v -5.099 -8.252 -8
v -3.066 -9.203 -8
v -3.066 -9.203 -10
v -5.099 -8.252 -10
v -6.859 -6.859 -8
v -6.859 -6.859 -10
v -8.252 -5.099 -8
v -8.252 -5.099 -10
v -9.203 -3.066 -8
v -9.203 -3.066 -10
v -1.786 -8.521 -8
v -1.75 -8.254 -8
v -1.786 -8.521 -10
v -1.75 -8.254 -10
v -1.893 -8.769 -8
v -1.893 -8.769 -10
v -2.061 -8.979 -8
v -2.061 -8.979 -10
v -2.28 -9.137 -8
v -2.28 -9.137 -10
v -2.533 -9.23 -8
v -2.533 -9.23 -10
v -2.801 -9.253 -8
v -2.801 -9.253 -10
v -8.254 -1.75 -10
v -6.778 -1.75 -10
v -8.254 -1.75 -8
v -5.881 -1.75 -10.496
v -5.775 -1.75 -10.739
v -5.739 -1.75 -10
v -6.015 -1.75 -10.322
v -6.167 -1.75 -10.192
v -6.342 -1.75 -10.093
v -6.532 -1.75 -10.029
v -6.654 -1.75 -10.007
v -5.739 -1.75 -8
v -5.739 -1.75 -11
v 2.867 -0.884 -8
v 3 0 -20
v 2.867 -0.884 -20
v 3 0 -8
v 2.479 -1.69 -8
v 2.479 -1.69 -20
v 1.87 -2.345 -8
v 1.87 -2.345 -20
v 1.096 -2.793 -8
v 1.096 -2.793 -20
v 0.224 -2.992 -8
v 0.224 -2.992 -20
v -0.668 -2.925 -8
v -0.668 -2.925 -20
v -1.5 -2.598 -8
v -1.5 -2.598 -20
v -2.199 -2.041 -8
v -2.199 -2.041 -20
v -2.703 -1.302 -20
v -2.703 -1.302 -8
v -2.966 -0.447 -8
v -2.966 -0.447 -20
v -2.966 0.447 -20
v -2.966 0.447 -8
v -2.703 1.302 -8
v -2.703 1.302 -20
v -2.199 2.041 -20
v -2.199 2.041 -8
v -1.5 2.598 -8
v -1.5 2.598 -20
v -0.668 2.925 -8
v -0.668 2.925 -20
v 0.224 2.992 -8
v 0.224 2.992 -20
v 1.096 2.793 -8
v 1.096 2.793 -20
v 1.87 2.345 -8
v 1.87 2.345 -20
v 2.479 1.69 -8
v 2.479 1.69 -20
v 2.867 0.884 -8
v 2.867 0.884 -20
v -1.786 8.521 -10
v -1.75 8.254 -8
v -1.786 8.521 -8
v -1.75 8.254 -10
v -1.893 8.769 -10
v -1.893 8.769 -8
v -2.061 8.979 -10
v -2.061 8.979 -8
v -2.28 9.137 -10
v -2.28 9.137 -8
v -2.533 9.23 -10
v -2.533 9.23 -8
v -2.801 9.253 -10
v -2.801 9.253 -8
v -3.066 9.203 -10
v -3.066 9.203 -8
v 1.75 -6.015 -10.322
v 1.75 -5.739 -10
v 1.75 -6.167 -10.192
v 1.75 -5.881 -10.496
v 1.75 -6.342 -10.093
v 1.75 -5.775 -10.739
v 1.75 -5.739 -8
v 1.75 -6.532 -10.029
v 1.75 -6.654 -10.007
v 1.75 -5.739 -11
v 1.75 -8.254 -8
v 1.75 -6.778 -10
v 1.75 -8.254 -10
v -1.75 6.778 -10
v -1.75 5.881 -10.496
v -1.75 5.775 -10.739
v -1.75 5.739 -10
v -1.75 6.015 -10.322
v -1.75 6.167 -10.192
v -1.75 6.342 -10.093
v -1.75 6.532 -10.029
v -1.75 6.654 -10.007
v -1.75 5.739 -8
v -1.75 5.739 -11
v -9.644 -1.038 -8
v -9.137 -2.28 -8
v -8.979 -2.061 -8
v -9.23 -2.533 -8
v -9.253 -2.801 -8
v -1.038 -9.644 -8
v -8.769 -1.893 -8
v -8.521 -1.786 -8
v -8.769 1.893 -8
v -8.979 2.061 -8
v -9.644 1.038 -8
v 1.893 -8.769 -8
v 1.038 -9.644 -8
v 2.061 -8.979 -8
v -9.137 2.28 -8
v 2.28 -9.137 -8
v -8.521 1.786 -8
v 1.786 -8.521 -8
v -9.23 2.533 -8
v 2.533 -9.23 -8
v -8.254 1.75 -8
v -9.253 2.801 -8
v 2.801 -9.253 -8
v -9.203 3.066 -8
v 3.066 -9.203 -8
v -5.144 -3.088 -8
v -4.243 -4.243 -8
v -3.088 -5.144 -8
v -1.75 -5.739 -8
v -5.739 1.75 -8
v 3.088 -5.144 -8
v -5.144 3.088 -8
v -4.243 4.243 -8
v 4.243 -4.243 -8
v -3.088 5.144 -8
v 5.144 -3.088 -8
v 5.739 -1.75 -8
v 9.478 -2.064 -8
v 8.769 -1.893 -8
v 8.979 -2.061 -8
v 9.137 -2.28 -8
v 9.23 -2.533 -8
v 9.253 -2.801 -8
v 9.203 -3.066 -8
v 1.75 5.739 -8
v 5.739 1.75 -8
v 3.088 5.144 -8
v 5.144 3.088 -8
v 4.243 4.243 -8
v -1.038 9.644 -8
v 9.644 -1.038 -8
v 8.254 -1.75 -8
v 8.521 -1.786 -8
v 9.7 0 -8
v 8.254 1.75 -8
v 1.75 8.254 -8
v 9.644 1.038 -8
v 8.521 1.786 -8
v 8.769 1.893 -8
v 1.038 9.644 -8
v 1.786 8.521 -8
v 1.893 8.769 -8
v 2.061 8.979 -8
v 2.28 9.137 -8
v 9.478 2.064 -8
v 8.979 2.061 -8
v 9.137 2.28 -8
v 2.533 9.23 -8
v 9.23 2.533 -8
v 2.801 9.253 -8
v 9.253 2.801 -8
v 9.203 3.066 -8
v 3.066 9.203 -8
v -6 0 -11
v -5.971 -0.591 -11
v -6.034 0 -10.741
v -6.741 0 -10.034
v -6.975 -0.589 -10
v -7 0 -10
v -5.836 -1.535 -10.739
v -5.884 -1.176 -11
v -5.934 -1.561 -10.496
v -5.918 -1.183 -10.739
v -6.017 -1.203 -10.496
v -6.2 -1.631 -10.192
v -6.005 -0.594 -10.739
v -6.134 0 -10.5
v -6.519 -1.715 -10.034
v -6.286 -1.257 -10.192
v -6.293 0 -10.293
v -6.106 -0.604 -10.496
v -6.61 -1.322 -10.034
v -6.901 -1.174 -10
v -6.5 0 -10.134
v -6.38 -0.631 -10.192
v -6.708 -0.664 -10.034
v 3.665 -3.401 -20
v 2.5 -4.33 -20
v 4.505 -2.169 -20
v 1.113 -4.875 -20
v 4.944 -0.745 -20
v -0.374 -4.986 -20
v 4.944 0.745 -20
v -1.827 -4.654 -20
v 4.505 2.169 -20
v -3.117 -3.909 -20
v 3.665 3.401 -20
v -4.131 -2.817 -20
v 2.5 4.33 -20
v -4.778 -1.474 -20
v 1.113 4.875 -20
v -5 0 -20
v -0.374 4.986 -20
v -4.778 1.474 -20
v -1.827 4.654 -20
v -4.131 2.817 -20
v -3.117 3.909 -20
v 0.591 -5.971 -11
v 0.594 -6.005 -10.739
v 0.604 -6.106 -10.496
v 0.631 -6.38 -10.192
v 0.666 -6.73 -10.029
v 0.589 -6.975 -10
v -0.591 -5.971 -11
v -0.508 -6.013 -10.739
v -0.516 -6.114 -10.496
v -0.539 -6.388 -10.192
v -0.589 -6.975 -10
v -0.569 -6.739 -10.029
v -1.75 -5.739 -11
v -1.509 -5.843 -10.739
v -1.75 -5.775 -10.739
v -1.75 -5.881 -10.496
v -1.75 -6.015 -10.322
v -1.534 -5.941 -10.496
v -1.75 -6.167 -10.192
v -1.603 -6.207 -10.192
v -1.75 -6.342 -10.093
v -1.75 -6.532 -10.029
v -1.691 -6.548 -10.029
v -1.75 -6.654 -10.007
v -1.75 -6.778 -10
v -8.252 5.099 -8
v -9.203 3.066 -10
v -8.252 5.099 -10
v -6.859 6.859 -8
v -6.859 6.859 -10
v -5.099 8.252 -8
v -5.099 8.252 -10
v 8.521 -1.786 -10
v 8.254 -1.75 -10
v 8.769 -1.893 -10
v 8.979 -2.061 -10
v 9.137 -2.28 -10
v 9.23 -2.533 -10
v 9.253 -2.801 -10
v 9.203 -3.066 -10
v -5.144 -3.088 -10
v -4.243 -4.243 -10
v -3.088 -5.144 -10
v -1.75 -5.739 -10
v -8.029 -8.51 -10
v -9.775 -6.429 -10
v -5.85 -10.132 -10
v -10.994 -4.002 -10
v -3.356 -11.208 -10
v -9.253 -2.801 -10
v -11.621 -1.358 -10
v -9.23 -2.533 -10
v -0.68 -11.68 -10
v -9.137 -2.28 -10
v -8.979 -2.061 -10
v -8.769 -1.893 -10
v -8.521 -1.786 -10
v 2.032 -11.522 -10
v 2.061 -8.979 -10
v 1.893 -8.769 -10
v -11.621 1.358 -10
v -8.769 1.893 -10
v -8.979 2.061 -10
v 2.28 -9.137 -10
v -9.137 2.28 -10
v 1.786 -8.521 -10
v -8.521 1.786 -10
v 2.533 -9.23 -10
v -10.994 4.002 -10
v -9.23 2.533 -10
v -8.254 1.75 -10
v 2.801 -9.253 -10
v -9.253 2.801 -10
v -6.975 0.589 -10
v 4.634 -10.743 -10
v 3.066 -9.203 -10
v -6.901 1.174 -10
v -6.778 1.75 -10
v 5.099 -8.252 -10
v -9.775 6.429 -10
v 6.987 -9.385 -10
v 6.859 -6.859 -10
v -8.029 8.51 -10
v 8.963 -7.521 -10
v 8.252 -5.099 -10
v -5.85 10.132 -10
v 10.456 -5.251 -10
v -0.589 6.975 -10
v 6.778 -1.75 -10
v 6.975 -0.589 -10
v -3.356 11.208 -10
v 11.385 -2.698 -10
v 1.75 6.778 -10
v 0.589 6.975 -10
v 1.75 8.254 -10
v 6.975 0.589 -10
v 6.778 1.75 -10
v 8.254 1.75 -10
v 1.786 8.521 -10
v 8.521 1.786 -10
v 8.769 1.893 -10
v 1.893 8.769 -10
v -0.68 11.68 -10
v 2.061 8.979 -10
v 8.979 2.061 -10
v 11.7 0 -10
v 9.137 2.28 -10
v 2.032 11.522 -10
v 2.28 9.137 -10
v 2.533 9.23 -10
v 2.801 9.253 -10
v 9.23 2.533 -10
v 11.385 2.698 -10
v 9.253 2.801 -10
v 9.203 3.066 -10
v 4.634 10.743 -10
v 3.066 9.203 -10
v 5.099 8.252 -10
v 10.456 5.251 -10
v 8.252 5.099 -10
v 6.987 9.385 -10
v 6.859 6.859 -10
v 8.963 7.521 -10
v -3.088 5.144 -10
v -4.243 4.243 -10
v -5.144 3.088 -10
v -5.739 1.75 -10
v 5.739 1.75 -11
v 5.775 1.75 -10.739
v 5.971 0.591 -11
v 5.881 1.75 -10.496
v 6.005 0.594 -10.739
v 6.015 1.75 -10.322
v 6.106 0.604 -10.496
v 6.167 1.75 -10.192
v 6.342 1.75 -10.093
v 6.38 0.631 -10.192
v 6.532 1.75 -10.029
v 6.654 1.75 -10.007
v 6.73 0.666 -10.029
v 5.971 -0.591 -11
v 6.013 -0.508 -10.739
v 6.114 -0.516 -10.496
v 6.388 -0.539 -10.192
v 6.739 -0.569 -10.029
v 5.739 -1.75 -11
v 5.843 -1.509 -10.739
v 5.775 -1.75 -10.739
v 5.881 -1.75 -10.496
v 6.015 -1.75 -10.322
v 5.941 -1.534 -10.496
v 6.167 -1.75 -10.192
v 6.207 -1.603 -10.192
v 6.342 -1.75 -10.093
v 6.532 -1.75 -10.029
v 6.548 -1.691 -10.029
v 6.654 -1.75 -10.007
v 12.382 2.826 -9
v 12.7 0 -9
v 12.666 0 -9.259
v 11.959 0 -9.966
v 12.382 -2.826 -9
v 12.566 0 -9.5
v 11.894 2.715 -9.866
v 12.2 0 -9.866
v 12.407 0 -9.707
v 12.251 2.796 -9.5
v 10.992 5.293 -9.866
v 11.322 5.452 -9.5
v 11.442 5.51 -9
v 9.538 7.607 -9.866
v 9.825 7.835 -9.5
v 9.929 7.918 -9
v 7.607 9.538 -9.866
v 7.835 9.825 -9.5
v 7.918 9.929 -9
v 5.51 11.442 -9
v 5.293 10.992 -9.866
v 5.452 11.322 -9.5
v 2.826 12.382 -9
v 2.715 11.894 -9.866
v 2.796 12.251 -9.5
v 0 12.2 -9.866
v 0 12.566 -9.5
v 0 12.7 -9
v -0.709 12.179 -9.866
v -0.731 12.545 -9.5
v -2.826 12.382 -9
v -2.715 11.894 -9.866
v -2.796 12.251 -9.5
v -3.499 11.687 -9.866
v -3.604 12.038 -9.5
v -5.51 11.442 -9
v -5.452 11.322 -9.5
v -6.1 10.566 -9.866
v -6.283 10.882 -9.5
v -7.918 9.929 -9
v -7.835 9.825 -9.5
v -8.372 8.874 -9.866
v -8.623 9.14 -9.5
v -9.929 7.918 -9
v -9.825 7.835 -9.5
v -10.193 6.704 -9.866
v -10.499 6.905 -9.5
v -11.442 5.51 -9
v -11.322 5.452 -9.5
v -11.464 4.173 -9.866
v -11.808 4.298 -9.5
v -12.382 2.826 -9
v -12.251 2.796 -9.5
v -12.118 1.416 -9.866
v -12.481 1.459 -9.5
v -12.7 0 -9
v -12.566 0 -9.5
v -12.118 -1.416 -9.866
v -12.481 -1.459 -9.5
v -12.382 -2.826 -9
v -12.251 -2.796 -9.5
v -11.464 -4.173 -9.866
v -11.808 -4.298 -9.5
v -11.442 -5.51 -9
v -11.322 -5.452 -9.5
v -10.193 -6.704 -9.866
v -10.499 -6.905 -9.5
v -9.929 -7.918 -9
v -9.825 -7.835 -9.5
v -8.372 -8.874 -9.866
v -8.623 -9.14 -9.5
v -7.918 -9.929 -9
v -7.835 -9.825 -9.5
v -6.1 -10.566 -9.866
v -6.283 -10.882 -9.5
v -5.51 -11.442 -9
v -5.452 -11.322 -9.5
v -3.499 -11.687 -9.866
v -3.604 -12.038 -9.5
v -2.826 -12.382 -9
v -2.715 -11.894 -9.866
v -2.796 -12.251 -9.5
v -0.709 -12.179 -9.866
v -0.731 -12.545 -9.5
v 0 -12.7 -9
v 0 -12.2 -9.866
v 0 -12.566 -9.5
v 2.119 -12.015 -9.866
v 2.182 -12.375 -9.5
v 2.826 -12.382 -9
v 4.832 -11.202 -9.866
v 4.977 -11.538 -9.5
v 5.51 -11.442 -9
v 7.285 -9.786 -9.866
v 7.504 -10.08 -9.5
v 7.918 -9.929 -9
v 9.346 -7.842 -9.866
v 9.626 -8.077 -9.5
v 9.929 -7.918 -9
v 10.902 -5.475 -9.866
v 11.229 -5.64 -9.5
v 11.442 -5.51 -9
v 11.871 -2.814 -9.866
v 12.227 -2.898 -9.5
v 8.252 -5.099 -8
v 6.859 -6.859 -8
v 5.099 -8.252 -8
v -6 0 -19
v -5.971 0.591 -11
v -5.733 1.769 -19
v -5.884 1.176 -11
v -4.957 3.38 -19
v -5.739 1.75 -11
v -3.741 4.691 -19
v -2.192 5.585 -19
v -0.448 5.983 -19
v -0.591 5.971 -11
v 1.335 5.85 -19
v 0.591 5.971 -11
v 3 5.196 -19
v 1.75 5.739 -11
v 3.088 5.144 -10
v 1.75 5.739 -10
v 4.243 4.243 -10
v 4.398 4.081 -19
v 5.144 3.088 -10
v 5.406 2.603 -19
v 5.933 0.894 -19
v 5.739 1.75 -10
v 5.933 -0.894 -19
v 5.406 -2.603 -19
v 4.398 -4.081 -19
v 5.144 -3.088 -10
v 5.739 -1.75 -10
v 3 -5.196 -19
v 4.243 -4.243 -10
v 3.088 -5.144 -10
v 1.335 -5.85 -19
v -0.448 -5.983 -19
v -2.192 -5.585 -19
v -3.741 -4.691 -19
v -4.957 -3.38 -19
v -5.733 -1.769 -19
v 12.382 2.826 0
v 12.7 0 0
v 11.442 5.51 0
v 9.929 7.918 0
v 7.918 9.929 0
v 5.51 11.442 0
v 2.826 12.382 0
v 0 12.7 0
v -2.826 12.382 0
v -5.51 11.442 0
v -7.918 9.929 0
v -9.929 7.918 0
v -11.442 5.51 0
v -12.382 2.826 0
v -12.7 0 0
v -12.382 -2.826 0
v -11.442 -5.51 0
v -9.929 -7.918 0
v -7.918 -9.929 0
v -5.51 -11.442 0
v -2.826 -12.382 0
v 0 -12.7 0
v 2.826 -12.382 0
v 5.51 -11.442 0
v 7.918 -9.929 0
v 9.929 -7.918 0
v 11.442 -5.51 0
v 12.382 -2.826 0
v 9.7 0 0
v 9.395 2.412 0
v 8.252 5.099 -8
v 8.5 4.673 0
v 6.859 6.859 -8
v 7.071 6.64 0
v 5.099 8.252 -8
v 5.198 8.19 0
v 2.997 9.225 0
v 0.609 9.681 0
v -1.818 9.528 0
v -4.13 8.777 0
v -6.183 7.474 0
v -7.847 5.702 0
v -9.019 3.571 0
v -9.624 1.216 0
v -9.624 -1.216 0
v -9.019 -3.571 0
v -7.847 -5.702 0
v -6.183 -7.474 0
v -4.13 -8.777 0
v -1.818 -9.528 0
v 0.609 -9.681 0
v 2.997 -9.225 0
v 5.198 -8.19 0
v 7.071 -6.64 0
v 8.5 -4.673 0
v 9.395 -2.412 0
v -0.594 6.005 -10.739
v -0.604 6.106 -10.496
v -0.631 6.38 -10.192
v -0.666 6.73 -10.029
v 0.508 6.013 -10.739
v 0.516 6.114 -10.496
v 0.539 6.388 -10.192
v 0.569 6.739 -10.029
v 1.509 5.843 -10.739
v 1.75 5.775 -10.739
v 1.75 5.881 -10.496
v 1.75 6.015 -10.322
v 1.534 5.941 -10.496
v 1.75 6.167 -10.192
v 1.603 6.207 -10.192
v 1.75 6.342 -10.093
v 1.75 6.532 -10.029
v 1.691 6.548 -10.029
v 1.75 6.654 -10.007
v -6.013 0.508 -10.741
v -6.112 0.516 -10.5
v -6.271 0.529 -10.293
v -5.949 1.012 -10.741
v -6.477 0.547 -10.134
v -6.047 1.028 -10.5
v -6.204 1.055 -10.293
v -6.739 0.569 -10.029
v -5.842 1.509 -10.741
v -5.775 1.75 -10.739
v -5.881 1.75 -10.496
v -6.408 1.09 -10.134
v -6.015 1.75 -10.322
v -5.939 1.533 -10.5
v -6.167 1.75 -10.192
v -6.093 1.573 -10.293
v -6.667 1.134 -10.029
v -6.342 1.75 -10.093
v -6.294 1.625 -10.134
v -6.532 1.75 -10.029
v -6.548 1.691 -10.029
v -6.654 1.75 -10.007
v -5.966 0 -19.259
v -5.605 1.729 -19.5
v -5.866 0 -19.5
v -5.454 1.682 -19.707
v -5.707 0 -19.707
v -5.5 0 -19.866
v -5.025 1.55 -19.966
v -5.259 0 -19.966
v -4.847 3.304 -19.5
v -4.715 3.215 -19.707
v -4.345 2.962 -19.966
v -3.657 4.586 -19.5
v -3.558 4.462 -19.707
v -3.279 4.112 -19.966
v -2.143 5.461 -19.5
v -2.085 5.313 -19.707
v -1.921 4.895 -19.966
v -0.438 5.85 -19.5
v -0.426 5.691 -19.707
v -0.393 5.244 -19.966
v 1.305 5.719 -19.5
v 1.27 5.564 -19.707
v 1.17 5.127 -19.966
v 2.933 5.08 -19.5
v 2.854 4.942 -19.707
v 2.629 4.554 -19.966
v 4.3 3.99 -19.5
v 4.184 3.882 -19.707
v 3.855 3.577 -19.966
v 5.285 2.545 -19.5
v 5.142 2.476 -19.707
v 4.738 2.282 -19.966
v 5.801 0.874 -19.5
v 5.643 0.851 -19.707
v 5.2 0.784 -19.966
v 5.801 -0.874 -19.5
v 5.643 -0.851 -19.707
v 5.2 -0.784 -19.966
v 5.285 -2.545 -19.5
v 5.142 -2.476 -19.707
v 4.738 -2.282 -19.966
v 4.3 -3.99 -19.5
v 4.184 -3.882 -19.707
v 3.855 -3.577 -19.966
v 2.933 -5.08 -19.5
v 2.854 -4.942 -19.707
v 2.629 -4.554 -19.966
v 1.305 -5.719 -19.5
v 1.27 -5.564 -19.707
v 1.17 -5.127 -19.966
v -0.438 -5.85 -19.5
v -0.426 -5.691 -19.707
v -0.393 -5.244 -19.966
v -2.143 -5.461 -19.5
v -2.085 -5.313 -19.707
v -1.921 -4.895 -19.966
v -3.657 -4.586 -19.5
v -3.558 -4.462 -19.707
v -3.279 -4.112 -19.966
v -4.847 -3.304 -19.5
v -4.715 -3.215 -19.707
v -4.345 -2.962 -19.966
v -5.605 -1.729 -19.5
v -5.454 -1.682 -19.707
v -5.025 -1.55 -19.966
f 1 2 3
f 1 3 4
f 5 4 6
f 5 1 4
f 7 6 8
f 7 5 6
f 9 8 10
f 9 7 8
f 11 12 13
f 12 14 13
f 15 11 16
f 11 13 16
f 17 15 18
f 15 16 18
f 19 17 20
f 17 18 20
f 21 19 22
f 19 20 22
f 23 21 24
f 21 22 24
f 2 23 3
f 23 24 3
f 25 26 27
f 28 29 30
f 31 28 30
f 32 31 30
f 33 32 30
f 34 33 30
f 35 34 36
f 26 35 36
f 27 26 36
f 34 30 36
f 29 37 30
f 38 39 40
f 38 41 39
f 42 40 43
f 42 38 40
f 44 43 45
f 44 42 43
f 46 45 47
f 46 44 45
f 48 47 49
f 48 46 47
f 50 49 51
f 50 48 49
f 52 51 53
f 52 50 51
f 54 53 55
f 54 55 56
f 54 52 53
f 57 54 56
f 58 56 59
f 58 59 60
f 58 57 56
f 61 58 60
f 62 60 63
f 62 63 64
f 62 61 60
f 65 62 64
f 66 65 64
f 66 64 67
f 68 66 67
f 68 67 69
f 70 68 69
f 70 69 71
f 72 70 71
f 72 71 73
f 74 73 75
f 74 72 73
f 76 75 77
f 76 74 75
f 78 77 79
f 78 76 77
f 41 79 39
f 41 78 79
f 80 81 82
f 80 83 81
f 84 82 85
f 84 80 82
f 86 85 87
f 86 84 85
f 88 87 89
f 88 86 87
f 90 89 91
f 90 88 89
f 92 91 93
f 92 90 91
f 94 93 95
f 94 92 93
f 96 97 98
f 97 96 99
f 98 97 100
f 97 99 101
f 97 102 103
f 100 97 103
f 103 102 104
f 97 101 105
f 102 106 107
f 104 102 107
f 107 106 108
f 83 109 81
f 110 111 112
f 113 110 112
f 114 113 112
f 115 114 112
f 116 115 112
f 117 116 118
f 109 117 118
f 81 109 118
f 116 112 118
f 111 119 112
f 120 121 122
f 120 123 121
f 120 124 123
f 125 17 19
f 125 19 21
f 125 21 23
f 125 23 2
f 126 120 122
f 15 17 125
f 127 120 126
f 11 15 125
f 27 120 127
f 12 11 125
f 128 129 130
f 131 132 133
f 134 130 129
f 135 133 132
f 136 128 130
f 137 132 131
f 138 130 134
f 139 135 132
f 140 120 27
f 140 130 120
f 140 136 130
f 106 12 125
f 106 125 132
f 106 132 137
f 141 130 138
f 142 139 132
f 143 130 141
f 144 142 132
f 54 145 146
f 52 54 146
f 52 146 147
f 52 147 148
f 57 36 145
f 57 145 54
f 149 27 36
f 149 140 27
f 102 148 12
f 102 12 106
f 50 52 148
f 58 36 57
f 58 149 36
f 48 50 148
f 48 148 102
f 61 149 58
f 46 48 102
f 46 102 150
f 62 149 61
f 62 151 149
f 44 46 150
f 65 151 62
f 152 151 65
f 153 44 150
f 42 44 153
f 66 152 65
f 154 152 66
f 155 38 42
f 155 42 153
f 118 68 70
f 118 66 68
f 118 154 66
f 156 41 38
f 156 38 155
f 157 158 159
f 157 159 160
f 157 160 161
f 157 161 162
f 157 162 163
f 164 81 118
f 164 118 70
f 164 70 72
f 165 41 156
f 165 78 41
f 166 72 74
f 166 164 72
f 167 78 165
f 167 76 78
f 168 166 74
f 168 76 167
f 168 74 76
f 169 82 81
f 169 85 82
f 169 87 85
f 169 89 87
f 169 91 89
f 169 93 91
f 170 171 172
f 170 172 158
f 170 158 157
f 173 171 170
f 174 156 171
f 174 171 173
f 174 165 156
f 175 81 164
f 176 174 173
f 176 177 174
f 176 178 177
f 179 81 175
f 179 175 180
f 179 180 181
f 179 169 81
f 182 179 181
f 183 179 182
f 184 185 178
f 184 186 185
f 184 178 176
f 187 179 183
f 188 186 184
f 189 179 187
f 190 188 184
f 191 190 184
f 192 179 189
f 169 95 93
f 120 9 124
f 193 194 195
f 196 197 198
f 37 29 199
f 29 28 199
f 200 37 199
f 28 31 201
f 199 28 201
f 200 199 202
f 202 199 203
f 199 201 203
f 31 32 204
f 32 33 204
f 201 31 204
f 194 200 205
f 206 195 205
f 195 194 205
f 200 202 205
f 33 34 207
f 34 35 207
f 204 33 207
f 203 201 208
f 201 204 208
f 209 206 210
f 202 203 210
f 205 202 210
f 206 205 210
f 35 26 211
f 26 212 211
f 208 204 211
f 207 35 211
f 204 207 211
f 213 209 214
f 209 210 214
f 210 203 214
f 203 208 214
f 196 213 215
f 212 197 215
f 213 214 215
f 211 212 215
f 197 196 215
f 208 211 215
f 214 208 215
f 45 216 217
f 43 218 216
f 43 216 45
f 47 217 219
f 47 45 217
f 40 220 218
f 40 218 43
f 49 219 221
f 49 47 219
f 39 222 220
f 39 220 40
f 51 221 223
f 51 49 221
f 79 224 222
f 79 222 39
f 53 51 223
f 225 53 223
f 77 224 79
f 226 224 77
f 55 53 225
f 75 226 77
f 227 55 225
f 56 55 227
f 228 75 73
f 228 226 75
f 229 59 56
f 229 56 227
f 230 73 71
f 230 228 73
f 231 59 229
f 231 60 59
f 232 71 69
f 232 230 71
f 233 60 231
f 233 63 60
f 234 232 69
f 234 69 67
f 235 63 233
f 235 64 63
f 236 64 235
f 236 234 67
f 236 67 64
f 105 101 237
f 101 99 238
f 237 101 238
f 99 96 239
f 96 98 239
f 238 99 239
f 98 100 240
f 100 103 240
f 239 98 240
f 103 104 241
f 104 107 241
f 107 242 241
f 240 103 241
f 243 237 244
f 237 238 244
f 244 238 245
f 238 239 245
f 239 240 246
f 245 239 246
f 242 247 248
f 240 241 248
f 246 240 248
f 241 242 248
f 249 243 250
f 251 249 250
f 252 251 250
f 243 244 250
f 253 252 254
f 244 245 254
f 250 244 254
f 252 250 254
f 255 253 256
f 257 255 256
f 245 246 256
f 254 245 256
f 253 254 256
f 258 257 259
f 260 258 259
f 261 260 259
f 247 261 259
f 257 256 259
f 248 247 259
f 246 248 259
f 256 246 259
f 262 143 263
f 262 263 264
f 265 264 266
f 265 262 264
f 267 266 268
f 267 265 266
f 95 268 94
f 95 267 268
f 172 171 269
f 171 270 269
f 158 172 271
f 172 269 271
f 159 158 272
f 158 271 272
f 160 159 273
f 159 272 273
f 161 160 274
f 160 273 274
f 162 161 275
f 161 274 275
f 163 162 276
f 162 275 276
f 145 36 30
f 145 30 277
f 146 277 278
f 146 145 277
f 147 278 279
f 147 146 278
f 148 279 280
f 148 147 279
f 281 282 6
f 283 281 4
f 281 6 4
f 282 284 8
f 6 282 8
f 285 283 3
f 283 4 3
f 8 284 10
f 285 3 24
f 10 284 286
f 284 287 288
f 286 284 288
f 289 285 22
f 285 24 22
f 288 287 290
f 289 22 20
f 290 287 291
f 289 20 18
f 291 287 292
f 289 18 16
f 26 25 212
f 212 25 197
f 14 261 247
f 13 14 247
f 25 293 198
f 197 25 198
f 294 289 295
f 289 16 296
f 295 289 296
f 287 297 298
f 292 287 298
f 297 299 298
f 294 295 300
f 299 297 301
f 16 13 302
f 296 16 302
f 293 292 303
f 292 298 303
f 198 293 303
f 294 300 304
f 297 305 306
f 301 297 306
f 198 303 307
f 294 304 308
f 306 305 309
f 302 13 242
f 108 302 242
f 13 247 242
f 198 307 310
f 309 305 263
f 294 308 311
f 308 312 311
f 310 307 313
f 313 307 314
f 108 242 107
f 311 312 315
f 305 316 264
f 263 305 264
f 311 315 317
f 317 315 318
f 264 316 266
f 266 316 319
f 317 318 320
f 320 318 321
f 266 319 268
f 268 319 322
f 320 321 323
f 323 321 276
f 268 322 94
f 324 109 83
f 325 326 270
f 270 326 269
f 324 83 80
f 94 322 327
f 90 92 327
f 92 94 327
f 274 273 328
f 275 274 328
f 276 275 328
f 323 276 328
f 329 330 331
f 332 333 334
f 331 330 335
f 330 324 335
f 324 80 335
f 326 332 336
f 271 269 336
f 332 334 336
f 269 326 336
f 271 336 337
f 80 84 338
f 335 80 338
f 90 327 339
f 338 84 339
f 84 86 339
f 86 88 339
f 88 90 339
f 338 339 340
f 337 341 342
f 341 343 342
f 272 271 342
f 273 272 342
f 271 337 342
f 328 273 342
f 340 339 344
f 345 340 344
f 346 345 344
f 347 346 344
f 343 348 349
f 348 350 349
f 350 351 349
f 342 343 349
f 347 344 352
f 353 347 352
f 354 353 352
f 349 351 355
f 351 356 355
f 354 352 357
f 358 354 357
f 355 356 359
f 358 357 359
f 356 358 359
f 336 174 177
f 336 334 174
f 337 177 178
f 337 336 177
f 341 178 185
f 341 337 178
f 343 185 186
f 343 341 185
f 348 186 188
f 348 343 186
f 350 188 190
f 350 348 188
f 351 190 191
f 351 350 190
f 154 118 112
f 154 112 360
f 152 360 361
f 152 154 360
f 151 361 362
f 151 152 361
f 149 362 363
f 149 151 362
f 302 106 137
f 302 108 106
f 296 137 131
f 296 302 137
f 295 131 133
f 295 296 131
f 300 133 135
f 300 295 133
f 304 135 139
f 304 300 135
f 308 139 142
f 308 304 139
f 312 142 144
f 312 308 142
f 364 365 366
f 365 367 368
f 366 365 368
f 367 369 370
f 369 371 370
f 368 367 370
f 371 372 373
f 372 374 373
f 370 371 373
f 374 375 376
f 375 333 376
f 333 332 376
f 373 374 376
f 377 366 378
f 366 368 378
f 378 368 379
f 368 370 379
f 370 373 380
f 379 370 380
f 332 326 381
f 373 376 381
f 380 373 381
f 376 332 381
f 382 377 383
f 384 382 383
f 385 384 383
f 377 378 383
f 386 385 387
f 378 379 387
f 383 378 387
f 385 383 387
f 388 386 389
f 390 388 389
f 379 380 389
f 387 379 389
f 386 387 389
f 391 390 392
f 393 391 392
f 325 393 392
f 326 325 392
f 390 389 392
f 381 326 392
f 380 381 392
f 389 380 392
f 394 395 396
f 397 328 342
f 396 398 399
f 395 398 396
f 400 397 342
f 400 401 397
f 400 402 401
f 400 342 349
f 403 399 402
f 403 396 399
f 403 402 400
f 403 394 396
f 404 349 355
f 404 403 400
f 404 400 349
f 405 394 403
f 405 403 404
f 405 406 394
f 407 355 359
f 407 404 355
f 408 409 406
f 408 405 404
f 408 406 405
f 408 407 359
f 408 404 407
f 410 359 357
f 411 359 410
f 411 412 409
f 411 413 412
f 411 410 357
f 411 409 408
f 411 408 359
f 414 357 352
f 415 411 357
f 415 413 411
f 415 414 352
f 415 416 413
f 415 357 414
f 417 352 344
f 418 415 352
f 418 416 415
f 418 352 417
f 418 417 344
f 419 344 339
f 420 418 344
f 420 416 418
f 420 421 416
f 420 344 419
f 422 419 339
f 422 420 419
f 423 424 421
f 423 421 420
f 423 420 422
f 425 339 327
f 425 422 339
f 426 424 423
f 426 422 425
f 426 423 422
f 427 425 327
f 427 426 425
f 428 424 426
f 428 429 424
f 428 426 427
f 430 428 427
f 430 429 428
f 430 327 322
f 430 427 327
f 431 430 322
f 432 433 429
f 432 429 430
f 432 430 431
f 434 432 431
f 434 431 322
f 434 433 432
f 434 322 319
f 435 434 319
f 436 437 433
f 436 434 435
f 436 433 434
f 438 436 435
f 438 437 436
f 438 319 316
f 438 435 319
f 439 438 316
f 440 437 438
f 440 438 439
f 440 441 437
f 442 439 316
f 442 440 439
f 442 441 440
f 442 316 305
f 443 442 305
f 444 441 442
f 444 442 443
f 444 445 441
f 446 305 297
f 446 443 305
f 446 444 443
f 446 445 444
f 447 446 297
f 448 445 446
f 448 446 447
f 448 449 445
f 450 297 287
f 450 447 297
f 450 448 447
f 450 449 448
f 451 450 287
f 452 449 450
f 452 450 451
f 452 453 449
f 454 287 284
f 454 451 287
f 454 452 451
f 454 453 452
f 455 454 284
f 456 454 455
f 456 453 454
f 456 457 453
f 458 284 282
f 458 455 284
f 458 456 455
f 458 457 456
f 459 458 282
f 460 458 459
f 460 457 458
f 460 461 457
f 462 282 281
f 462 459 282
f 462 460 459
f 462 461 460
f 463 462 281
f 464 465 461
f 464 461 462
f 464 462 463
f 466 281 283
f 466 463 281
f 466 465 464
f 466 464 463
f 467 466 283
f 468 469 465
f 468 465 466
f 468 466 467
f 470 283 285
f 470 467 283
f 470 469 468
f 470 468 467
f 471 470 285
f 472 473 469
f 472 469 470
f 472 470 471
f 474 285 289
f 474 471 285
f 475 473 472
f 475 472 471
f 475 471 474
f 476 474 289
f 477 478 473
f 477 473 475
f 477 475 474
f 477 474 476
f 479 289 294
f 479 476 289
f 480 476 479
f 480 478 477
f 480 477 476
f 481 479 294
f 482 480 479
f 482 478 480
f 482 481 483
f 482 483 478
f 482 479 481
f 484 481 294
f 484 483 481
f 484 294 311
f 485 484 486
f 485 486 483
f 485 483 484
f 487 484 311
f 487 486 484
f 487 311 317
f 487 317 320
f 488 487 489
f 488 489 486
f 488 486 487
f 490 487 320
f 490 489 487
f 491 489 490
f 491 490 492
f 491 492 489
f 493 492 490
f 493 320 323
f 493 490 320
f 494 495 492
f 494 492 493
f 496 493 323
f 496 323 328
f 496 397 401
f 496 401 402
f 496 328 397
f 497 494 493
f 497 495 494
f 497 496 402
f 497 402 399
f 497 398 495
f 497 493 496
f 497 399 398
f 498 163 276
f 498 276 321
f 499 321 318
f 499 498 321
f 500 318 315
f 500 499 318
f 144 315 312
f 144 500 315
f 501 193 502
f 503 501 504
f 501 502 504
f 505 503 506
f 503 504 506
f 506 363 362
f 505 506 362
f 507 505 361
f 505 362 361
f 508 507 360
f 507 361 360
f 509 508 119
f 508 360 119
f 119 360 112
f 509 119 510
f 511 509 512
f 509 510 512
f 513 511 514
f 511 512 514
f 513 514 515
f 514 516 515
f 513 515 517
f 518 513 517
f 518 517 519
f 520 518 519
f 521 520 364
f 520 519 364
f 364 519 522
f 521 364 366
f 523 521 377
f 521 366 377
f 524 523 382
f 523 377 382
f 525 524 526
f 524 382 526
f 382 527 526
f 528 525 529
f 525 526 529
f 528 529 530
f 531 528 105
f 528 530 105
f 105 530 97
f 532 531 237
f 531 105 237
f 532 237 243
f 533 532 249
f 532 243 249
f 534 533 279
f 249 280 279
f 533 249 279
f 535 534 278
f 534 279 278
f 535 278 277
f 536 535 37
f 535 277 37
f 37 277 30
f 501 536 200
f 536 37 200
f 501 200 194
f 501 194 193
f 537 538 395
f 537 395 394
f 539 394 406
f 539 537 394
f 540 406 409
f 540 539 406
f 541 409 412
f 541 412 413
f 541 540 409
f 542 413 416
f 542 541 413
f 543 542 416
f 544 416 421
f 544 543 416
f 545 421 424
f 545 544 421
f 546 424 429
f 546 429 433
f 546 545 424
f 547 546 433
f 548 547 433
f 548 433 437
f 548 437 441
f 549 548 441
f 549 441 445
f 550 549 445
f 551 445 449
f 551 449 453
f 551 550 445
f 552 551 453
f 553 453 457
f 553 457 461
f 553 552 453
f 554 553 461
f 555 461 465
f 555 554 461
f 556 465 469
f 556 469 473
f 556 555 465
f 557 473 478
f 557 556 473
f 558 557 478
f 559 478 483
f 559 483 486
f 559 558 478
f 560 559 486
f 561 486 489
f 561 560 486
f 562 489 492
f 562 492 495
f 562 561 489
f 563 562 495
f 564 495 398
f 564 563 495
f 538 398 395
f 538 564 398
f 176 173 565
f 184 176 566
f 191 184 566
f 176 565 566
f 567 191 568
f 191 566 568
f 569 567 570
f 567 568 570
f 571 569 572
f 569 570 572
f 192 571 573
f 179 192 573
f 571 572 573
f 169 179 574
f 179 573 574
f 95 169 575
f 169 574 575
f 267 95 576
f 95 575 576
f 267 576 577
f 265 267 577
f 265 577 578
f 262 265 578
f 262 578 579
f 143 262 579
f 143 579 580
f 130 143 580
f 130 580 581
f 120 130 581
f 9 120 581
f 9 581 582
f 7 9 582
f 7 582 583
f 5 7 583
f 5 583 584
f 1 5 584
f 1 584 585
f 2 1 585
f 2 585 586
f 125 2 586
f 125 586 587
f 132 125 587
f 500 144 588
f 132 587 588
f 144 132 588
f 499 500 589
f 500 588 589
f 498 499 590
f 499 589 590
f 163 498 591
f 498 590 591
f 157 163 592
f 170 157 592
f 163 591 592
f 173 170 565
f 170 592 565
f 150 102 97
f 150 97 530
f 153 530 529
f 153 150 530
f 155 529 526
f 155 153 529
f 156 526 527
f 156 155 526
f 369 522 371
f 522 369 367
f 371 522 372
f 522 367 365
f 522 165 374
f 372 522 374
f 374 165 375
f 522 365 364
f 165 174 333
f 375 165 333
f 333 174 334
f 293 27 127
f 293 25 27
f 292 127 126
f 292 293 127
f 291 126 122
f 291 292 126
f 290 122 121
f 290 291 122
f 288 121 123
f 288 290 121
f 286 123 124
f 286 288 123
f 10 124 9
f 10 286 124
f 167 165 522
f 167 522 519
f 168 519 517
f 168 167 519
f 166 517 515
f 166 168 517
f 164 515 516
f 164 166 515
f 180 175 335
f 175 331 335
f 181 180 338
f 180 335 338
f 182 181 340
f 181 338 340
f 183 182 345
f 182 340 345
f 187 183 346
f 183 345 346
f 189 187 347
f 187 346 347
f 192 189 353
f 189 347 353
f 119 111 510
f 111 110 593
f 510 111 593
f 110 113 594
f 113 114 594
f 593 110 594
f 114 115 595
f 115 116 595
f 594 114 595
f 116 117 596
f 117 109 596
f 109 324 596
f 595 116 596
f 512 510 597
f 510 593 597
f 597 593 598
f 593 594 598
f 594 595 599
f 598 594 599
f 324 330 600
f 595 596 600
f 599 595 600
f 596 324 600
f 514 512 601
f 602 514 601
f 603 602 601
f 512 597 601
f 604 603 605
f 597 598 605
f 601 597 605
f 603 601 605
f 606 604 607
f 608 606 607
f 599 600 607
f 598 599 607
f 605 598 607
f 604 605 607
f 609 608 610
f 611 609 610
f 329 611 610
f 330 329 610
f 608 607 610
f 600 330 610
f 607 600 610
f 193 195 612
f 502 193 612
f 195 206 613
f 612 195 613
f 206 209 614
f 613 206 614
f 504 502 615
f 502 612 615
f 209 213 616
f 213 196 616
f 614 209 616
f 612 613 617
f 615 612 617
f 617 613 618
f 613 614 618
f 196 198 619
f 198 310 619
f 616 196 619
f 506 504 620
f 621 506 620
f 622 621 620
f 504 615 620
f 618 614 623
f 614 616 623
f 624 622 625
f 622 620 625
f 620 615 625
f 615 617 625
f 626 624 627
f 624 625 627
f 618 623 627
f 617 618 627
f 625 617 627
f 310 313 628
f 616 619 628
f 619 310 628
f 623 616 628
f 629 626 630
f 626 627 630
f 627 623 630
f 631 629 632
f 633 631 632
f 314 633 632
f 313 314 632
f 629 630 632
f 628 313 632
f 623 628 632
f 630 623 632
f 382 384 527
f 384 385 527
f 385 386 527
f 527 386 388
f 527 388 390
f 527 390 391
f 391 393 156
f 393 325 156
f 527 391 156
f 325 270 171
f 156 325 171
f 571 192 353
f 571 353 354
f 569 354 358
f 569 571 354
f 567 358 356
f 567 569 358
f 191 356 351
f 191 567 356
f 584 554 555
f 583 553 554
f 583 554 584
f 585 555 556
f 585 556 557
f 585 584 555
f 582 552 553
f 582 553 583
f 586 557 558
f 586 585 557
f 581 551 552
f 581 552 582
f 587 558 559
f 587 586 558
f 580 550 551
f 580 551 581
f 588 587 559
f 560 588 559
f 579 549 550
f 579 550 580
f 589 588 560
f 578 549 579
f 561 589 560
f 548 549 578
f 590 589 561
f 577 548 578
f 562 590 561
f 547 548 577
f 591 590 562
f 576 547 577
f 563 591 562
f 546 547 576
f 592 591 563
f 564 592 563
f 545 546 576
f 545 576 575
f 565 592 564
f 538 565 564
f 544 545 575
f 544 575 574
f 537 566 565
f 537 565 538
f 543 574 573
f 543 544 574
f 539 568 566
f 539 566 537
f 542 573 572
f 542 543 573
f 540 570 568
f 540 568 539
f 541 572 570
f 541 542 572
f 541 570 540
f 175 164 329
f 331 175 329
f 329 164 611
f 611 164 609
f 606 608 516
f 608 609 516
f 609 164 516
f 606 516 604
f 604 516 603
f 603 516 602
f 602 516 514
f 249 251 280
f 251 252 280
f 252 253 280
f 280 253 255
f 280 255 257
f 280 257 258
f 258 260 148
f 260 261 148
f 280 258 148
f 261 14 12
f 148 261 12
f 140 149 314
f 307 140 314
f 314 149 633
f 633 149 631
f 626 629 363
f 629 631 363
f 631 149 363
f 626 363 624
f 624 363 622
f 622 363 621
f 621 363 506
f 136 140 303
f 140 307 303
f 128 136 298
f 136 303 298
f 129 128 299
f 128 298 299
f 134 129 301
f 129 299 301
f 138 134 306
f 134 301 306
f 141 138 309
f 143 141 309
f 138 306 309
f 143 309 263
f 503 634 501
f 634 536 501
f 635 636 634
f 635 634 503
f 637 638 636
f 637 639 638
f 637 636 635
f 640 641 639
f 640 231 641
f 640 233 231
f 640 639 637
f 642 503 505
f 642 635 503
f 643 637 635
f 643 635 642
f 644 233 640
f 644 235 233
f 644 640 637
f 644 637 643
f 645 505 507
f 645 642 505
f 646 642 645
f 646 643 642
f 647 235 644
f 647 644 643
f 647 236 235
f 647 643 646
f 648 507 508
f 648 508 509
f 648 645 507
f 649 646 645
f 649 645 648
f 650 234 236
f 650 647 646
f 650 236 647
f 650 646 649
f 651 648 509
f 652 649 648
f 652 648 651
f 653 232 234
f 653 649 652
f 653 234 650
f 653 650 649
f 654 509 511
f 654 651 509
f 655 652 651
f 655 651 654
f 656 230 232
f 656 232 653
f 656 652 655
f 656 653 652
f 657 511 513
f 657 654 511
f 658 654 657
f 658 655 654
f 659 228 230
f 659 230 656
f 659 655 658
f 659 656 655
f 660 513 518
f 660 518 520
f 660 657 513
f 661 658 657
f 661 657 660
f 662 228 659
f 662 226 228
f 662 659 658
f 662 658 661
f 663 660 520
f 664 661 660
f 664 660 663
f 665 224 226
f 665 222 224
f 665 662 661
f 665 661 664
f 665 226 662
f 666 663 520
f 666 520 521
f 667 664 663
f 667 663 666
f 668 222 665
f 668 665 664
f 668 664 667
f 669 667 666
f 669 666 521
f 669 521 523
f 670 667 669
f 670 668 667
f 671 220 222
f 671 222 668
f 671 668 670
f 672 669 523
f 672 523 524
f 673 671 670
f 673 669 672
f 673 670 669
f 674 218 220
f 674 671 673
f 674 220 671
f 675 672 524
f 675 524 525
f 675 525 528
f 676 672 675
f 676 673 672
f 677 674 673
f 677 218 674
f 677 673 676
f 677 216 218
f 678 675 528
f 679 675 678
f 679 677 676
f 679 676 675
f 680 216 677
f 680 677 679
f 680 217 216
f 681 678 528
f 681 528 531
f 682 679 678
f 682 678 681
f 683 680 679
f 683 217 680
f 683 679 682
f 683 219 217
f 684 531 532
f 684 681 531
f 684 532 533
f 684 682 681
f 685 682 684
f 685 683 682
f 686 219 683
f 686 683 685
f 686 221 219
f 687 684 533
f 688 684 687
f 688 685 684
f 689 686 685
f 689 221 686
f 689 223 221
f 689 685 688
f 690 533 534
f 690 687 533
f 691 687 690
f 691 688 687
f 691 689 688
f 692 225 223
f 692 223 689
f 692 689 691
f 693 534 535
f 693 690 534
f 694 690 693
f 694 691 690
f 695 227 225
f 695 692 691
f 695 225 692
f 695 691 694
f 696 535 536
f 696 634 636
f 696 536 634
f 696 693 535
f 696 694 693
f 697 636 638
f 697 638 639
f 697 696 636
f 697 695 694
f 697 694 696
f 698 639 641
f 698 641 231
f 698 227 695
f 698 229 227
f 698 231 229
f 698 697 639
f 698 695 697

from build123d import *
from build123d.topology import SkipClean

# Parameters (mm, degrees)
ESBO_O1_R                = 12.7
ESBO_O1_R_2              = 9.7
ESBO_O1_R_3              = 3
RESSALTO_EXTRUS_O1_DEPTH = 10
ESBO_O1_3_R              = 9.7
ESBO_O1_3_R_2            = 3
CORTE_EXTRUS_O1_DEPTH    = 8
CORTE_EXTRUS_O3_START    = -2
CORTE_EXTRUS_O3_DEPTH    = 2
FILETE1_R                = 1
ESBO_O2_5_R              = 6
ESBO_O2_5_R_2            = 3
RESSALTO_EXTRUS_O2_DEPTH = 10
FILETE2_R                = 1
FILETE3_R                = 1
FILETE4_R                = 1


with BuildPart() as part:
    # Esboço1 → Ressalto-extrusão1 (new body)
    # profile 1 of 2: a face of its own
    with BuildSketch(Plane.XY):
        Circle(ESBO_O1_R)
        Circle(ESBO_O1_R_2, mode=Mode.SUBTRACT)
    # profile 2 of 2: a face of its own
    with BuildSketch(Plane.XY):
        Circle(ESBO_O1_R_2)
        Circle(ESBO_O1_R_3, mode=Mode.SUBTRACT)
    extrude(amount=-RESSALTO_EXTRUS_O1_DEPTH)

    # Esboço1<3> → Corte-extrusão1 (cut)
    with BuildSketch(Plane.XY):
        Circle(ESBO_O1_3_R)
        Circle(ESBO_O1_3_R_2, mode=Mode.SUBTRACT)
    extrude(amount=-CORTE_EXTRUS_O1_DEPTH, mode=Mode.SUBTRACT)

    # Esboço2 → Corte-extrusão3 (cut)
    with SkipClean():  # the faces are left unmerged after this step: merging them gives an invalid solid
        with BuildSketch(Plane(origin=(0, 0, -10), x_dir=(-1, 0, 0), z_dir=(0, 0, -1)).offset(CORTE_EXTRUS_O3_START)):
            with BuildLine():
                Line((-1.75, -9.540833), (-1.75, -5.73912))
                ThreePointArc((-1.75, -5.73912), (-4.242641, -4.242641), (-5.73912, -1.75))
                Line((-5.73912, -1.75), (-9.540833, -1.75))
                ThreePointArc((-9.540833, -1.75), (-6.858936, -6.858936), (-1.75, -9.540833))
            make_face()
            with BuildLine():
                Line((-9.540833, 1.75), (-5.73912, 1.75))
                ThreePointArc((-5.73912, 1.75), (-4.242641, 4.242641), (-1.75, 5.73912))
                Line((-1.75, 5.73912), (-1.75, 9.540833))
                ThreePointArc((-1.75, 9.540833), (-6.858936, 6.858936), (-9.540833, 1.75))
            make_face()
            with BuildLine():
                Line((5.73912, 1.75), (9.540833, 1.75))
                ThreePointArc((9.540833, 1.75), (6.858936, 6.858936), (1.75, 9.540833))
                Line((1.75, 9.540833), (1.75, 5.73912))
                ThreePointArc((1.75, 5.73912), (4.242641, 4.242641), (5.73912, 1.75))
            make_face()
            with BuildLine():
                ThreePointArc((1.75, -9.540833), (6.858936, -6.858936), (9.540833, -1.75))
                Line((9.540833, -1.75), (5.73912, -1.75))
                ThreePointArc((5.73912, -1.75), (4.242641, -4.242641), (1.75, -5.73912))
                Line((1.75, -5.73912), (1.75, -9.540833))
            make_face()
        extrude(amount=CORTE_EXTRUS_O3_DEPTH, mode=Mode.SUBTRACT)

    # Filete1
    filete1_edges = [part.edges().sort_by_distance(p)[0] for p in [
        (-9.540833, -1.75, -9),
        (-1.75, -9.540833, -9),
        (-1.75, 9.540833, -9),
        (-9.540833, 1.75, -9),
        (9.540833, 1.75, -9),
        (1.75, 9.540833, -9),
        (1.75, -9.540833, -9),
        (9.540833, -1.75, -9),
    ]]
    fillet(filete1_edges, radius=FILETE1_R)

    # Esboço2<5> → Ressalto-extrusão2 (add)
    with SkipClean():  # the faces are left unmerged after this step: merging them gives an invalid solid
        with BuildSketch(Plane(origin=(0, 0, -10), x_dir=(-1, 0, 0), z_dir=(0, 0, -1))):
            Circle(ESBO_O2_5_R)
            with Locations(Location((0, 0, 0), (0, 0, 180))):
                Circle(ESBO_O2_5_R_2, mode=Mode.SUBTRACT)
        extrude(amount=RESSALTO_EXTRUS_O2_DEPTH)

    # Filete2
    # the kernel refuses this fillet: 1 mm, written as the material it adds along each edge
    with BuildSketch(Plane(origin=(0, 0, -10), x_dir=(-1, 0, 0), z_dir=(0, -1, 0))) as filete2_piece_1_section:
        with BuildLine():
            CenterArc((6 + FILETE2_R, FILETE2_R), FILETE2_R, 180, 90)
            Line((6, FILETE2_R), (6, 0))
            Line((6, 0), (6 + FILETE2_R, 0))
        make_face()
    filete2_piece_1 = revolve(axis=Axis((0, 0, -10), (0, 0, -1)), revolution_arc=40.831345, mode=Mode.PRIVATE)
    filete2_piece_1 = split(filete2_piece_1, bisect_by=Plane(origin=(-6.142197, 1.75, -10.226515), z_dir=(0, -1, 0)), keep=Keep.TOP, mode=Mode.PRIVATE)
    add(filete2_piece_1)
    with BuildSketch(Plane(origin=(0, 0, -10), x_dir=(0.6538481250913037, -0.7566258185619804, 0), z_dir=(0.7566258185619804, 0.6538481250913037, 0))) as filete2_piece_2_section:
        with BuildLine():
            CenterArc((6 + FILETE2_R, FILETE2_R), FILETE2_R, 180, 90)
            Line((6, FILETE2_R), (6, 0))
            Line((6, 0), (6 + FILETE2_R, 0))
        make_face()
    filete2_piece_2 = revolve(axis=Axis((0, 0, -10), (0, 0, -1)), revolution_arc=81.664733, mode=Mode.PRIVATE)
    filete2_piece_2 = split(filete2_piece_2, bisect_by=Plane(origin=(-1.75, -6.142197, -10.226515), z_dir=(1, 0, 0)), keep=Keep.TOP, mode=Mode.PRIVATE)
    filete2_piece_2 = split(filete2_piece_2, bisect_by=Plane(origin=(1.75, -6.142197, -10.226515), z_dir=(-1, 0, 0)), keep=Keep.TOP, mode=Mode.PRIVATE)
    add(filete2_piece_2)
    with BuildSketch(Plane(origin=(0, 0, -10), x_dir=(0.7566258185619548, 0.6538481250913332, 0), z_dir=(-0.6538481250913332, 0.7566258185619548, 0))) as filete2_piece_3_section:
        with BuildLine():
            CenterArc((6 + FILETE2_R, FILETE2_R), FILETE2_R, 180, 90)
            Line((6, FILETE2_R), (6, 0))
            Line((6, 0), (6 + FILETE2_R, 0))
        make_face()
    filete2_piece_3 = revolve(axis=Axis((0, 0, -10), (0, 0, -1)), revolution_arc=81.664733, mode=Mode.PRIVATE)
    filete2_piece_3 = split(filete2_piece_3, bisect_by=Plane(origin=(6.142197, -1.75, -10.226515), z_dir=(0, 1, 0)), keep=Keep.TOP, mode=Mode.PRIVATE)
    filete2_piece_3 = split(filete2_piece_3, bisect_by=Plane(origin=(6.142197, 1.75, -10.226515), z_dir=(0, -1, 0)), keep=Keep.TOP, mode=Mode.PRIVATE)
    add(filete2_piece_3)
    with BuildSketch(Plane(origin=(0, 0, -10), x_dir=(-0.6538481250913029, 0.7566258185619811, 0), z_dir=(-0.7566258185619811, -0.6538481250913029, 0))) as filete2_piece_4_section:
        with BuildLine():
            CenterArc((6 + FILETE2_R, FILETE2_R), FILETE2_R, 180, 90)
            Line((6, FILETE2_R), (6, 0))
            Line((6, 0), (6 + FILETE2_R, 0))
        make_face()
    filete2_piece_4 = revolve(axis=Axis((0, 0, -10), (0, 0, -1)), revolution_arc=81.664733, mode=Mode.PRIVATE)
    filete2_piece_4 = split(filete2_piece_4, bisect_by=Plane(origin=(1.75, 6.142197, -10.226515), z_dir=(-1, 0, 0)), keep=Keep.TOP, mode=Mode.PRIVATE)
    filete2_piece_4 = split(filete2_piece_4, bisect_by=Plane(origin=(-1.75, 6.142197, -10.226515), z_dir=(1, 0, 0)), keep=Keep.TOP, mode=Mode.PRIVATE)
    add(filete2_piece_4)
    with BuildSketch(Plane(origin=(0, 0, -10), x_dir=(-0.7566374717500711, -0.6538346399080277, 0), z_dir=(0.6538346399080277, -0.7566374717500711, 0))) as filete2_piece_5_section:
        with BuildLine():
            CenterArc((6 + FILETE2_R, FILETE2_R), FILETE2_R, 180, 90)
            Line((6, FILETE2_R), (6, 0))
            Line((6, 0), (6 + FILETE2_R, 0))
        make_face()
    filete2_piece_5 = revolve(axis=Axis((0, 0, -10), (0, 0, -1)), revolution_arc=40.831345, mode=Mode.PRIVATE)
    filete2_piece_5 = split(filete2_piece_5, bisect_by=Plane(origin=(-6.142196, -1.75, -10.226515), z_dir=(0, 1, 0)), keep=Keep.TOP, mode=Mode.PRIVATE)
    add(filete2_piece_5)

    # Filete3
    filete3_edges = [part.edges().sort_by_distance(p)[0] for p in [
        (6, 0, -20),
    ]]
    fillet(filete3_edges, radius=FILETE3_R)

    # Filete4
    filete4_edges = [part.edges().sort_by_distance(p)[0] for p in [
        (-12.7, 0, -10),
    ]]
    fillet(filete4_edges, radius=FILETE4_R)


solid = part.part
